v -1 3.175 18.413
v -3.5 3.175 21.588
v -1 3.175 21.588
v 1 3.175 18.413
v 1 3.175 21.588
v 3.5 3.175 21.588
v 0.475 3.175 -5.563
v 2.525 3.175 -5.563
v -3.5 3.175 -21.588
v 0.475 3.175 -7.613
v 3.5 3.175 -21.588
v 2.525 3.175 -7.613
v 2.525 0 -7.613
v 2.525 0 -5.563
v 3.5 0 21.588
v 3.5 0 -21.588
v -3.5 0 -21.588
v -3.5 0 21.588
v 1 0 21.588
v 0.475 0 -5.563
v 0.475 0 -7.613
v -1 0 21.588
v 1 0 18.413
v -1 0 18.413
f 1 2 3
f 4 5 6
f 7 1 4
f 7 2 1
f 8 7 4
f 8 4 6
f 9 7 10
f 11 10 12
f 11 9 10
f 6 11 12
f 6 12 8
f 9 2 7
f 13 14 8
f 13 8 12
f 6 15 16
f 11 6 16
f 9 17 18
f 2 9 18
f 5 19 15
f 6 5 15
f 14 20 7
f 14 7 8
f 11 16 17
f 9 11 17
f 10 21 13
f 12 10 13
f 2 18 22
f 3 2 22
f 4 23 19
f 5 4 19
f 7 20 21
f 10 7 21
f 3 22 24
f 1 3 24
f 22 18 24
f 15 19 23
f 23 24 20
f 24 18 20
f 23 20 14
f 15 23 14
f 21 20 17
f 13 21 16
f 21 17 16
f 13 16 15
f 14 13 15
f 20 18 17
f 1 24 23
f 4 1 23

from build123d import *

# Parameters (mm, degrees)
SKETCH1_W           = 2.05
SKETCH1_H           = 2.05
BOSS_EXTRUDE1_DEPTH = 3.175


with BuildPart() as part:
    # Sketch1 → Boss-Extrude1 (new body)
    with BuildSketch(Plane(origin=(0, 0, 0), x_dir=(1, 0, 0), z_dir=(0, 1, 0))):
        Polygon((1, -21.587500005), (3.5, -21.587500005), (3.5, 21.587500005), (-3.5, 21.587500005), (-3.5, -14.587500005), (-3.5, -17.087500005), (-3.5, -19.087500005), (-3.5, -21.587500005), (-1, -21.587500005), (-1, -18.412500005), (1, -18.412500005), align=None)
        with Locations((1.5, 6.587500005)):
            Rectangle(SKETCH1_W, SKETCH1_H, mode=Mode.SUBTRACT)
    extrude(amount=BOSS_EXTRUDE1_DEPTH)


solid = part.part
